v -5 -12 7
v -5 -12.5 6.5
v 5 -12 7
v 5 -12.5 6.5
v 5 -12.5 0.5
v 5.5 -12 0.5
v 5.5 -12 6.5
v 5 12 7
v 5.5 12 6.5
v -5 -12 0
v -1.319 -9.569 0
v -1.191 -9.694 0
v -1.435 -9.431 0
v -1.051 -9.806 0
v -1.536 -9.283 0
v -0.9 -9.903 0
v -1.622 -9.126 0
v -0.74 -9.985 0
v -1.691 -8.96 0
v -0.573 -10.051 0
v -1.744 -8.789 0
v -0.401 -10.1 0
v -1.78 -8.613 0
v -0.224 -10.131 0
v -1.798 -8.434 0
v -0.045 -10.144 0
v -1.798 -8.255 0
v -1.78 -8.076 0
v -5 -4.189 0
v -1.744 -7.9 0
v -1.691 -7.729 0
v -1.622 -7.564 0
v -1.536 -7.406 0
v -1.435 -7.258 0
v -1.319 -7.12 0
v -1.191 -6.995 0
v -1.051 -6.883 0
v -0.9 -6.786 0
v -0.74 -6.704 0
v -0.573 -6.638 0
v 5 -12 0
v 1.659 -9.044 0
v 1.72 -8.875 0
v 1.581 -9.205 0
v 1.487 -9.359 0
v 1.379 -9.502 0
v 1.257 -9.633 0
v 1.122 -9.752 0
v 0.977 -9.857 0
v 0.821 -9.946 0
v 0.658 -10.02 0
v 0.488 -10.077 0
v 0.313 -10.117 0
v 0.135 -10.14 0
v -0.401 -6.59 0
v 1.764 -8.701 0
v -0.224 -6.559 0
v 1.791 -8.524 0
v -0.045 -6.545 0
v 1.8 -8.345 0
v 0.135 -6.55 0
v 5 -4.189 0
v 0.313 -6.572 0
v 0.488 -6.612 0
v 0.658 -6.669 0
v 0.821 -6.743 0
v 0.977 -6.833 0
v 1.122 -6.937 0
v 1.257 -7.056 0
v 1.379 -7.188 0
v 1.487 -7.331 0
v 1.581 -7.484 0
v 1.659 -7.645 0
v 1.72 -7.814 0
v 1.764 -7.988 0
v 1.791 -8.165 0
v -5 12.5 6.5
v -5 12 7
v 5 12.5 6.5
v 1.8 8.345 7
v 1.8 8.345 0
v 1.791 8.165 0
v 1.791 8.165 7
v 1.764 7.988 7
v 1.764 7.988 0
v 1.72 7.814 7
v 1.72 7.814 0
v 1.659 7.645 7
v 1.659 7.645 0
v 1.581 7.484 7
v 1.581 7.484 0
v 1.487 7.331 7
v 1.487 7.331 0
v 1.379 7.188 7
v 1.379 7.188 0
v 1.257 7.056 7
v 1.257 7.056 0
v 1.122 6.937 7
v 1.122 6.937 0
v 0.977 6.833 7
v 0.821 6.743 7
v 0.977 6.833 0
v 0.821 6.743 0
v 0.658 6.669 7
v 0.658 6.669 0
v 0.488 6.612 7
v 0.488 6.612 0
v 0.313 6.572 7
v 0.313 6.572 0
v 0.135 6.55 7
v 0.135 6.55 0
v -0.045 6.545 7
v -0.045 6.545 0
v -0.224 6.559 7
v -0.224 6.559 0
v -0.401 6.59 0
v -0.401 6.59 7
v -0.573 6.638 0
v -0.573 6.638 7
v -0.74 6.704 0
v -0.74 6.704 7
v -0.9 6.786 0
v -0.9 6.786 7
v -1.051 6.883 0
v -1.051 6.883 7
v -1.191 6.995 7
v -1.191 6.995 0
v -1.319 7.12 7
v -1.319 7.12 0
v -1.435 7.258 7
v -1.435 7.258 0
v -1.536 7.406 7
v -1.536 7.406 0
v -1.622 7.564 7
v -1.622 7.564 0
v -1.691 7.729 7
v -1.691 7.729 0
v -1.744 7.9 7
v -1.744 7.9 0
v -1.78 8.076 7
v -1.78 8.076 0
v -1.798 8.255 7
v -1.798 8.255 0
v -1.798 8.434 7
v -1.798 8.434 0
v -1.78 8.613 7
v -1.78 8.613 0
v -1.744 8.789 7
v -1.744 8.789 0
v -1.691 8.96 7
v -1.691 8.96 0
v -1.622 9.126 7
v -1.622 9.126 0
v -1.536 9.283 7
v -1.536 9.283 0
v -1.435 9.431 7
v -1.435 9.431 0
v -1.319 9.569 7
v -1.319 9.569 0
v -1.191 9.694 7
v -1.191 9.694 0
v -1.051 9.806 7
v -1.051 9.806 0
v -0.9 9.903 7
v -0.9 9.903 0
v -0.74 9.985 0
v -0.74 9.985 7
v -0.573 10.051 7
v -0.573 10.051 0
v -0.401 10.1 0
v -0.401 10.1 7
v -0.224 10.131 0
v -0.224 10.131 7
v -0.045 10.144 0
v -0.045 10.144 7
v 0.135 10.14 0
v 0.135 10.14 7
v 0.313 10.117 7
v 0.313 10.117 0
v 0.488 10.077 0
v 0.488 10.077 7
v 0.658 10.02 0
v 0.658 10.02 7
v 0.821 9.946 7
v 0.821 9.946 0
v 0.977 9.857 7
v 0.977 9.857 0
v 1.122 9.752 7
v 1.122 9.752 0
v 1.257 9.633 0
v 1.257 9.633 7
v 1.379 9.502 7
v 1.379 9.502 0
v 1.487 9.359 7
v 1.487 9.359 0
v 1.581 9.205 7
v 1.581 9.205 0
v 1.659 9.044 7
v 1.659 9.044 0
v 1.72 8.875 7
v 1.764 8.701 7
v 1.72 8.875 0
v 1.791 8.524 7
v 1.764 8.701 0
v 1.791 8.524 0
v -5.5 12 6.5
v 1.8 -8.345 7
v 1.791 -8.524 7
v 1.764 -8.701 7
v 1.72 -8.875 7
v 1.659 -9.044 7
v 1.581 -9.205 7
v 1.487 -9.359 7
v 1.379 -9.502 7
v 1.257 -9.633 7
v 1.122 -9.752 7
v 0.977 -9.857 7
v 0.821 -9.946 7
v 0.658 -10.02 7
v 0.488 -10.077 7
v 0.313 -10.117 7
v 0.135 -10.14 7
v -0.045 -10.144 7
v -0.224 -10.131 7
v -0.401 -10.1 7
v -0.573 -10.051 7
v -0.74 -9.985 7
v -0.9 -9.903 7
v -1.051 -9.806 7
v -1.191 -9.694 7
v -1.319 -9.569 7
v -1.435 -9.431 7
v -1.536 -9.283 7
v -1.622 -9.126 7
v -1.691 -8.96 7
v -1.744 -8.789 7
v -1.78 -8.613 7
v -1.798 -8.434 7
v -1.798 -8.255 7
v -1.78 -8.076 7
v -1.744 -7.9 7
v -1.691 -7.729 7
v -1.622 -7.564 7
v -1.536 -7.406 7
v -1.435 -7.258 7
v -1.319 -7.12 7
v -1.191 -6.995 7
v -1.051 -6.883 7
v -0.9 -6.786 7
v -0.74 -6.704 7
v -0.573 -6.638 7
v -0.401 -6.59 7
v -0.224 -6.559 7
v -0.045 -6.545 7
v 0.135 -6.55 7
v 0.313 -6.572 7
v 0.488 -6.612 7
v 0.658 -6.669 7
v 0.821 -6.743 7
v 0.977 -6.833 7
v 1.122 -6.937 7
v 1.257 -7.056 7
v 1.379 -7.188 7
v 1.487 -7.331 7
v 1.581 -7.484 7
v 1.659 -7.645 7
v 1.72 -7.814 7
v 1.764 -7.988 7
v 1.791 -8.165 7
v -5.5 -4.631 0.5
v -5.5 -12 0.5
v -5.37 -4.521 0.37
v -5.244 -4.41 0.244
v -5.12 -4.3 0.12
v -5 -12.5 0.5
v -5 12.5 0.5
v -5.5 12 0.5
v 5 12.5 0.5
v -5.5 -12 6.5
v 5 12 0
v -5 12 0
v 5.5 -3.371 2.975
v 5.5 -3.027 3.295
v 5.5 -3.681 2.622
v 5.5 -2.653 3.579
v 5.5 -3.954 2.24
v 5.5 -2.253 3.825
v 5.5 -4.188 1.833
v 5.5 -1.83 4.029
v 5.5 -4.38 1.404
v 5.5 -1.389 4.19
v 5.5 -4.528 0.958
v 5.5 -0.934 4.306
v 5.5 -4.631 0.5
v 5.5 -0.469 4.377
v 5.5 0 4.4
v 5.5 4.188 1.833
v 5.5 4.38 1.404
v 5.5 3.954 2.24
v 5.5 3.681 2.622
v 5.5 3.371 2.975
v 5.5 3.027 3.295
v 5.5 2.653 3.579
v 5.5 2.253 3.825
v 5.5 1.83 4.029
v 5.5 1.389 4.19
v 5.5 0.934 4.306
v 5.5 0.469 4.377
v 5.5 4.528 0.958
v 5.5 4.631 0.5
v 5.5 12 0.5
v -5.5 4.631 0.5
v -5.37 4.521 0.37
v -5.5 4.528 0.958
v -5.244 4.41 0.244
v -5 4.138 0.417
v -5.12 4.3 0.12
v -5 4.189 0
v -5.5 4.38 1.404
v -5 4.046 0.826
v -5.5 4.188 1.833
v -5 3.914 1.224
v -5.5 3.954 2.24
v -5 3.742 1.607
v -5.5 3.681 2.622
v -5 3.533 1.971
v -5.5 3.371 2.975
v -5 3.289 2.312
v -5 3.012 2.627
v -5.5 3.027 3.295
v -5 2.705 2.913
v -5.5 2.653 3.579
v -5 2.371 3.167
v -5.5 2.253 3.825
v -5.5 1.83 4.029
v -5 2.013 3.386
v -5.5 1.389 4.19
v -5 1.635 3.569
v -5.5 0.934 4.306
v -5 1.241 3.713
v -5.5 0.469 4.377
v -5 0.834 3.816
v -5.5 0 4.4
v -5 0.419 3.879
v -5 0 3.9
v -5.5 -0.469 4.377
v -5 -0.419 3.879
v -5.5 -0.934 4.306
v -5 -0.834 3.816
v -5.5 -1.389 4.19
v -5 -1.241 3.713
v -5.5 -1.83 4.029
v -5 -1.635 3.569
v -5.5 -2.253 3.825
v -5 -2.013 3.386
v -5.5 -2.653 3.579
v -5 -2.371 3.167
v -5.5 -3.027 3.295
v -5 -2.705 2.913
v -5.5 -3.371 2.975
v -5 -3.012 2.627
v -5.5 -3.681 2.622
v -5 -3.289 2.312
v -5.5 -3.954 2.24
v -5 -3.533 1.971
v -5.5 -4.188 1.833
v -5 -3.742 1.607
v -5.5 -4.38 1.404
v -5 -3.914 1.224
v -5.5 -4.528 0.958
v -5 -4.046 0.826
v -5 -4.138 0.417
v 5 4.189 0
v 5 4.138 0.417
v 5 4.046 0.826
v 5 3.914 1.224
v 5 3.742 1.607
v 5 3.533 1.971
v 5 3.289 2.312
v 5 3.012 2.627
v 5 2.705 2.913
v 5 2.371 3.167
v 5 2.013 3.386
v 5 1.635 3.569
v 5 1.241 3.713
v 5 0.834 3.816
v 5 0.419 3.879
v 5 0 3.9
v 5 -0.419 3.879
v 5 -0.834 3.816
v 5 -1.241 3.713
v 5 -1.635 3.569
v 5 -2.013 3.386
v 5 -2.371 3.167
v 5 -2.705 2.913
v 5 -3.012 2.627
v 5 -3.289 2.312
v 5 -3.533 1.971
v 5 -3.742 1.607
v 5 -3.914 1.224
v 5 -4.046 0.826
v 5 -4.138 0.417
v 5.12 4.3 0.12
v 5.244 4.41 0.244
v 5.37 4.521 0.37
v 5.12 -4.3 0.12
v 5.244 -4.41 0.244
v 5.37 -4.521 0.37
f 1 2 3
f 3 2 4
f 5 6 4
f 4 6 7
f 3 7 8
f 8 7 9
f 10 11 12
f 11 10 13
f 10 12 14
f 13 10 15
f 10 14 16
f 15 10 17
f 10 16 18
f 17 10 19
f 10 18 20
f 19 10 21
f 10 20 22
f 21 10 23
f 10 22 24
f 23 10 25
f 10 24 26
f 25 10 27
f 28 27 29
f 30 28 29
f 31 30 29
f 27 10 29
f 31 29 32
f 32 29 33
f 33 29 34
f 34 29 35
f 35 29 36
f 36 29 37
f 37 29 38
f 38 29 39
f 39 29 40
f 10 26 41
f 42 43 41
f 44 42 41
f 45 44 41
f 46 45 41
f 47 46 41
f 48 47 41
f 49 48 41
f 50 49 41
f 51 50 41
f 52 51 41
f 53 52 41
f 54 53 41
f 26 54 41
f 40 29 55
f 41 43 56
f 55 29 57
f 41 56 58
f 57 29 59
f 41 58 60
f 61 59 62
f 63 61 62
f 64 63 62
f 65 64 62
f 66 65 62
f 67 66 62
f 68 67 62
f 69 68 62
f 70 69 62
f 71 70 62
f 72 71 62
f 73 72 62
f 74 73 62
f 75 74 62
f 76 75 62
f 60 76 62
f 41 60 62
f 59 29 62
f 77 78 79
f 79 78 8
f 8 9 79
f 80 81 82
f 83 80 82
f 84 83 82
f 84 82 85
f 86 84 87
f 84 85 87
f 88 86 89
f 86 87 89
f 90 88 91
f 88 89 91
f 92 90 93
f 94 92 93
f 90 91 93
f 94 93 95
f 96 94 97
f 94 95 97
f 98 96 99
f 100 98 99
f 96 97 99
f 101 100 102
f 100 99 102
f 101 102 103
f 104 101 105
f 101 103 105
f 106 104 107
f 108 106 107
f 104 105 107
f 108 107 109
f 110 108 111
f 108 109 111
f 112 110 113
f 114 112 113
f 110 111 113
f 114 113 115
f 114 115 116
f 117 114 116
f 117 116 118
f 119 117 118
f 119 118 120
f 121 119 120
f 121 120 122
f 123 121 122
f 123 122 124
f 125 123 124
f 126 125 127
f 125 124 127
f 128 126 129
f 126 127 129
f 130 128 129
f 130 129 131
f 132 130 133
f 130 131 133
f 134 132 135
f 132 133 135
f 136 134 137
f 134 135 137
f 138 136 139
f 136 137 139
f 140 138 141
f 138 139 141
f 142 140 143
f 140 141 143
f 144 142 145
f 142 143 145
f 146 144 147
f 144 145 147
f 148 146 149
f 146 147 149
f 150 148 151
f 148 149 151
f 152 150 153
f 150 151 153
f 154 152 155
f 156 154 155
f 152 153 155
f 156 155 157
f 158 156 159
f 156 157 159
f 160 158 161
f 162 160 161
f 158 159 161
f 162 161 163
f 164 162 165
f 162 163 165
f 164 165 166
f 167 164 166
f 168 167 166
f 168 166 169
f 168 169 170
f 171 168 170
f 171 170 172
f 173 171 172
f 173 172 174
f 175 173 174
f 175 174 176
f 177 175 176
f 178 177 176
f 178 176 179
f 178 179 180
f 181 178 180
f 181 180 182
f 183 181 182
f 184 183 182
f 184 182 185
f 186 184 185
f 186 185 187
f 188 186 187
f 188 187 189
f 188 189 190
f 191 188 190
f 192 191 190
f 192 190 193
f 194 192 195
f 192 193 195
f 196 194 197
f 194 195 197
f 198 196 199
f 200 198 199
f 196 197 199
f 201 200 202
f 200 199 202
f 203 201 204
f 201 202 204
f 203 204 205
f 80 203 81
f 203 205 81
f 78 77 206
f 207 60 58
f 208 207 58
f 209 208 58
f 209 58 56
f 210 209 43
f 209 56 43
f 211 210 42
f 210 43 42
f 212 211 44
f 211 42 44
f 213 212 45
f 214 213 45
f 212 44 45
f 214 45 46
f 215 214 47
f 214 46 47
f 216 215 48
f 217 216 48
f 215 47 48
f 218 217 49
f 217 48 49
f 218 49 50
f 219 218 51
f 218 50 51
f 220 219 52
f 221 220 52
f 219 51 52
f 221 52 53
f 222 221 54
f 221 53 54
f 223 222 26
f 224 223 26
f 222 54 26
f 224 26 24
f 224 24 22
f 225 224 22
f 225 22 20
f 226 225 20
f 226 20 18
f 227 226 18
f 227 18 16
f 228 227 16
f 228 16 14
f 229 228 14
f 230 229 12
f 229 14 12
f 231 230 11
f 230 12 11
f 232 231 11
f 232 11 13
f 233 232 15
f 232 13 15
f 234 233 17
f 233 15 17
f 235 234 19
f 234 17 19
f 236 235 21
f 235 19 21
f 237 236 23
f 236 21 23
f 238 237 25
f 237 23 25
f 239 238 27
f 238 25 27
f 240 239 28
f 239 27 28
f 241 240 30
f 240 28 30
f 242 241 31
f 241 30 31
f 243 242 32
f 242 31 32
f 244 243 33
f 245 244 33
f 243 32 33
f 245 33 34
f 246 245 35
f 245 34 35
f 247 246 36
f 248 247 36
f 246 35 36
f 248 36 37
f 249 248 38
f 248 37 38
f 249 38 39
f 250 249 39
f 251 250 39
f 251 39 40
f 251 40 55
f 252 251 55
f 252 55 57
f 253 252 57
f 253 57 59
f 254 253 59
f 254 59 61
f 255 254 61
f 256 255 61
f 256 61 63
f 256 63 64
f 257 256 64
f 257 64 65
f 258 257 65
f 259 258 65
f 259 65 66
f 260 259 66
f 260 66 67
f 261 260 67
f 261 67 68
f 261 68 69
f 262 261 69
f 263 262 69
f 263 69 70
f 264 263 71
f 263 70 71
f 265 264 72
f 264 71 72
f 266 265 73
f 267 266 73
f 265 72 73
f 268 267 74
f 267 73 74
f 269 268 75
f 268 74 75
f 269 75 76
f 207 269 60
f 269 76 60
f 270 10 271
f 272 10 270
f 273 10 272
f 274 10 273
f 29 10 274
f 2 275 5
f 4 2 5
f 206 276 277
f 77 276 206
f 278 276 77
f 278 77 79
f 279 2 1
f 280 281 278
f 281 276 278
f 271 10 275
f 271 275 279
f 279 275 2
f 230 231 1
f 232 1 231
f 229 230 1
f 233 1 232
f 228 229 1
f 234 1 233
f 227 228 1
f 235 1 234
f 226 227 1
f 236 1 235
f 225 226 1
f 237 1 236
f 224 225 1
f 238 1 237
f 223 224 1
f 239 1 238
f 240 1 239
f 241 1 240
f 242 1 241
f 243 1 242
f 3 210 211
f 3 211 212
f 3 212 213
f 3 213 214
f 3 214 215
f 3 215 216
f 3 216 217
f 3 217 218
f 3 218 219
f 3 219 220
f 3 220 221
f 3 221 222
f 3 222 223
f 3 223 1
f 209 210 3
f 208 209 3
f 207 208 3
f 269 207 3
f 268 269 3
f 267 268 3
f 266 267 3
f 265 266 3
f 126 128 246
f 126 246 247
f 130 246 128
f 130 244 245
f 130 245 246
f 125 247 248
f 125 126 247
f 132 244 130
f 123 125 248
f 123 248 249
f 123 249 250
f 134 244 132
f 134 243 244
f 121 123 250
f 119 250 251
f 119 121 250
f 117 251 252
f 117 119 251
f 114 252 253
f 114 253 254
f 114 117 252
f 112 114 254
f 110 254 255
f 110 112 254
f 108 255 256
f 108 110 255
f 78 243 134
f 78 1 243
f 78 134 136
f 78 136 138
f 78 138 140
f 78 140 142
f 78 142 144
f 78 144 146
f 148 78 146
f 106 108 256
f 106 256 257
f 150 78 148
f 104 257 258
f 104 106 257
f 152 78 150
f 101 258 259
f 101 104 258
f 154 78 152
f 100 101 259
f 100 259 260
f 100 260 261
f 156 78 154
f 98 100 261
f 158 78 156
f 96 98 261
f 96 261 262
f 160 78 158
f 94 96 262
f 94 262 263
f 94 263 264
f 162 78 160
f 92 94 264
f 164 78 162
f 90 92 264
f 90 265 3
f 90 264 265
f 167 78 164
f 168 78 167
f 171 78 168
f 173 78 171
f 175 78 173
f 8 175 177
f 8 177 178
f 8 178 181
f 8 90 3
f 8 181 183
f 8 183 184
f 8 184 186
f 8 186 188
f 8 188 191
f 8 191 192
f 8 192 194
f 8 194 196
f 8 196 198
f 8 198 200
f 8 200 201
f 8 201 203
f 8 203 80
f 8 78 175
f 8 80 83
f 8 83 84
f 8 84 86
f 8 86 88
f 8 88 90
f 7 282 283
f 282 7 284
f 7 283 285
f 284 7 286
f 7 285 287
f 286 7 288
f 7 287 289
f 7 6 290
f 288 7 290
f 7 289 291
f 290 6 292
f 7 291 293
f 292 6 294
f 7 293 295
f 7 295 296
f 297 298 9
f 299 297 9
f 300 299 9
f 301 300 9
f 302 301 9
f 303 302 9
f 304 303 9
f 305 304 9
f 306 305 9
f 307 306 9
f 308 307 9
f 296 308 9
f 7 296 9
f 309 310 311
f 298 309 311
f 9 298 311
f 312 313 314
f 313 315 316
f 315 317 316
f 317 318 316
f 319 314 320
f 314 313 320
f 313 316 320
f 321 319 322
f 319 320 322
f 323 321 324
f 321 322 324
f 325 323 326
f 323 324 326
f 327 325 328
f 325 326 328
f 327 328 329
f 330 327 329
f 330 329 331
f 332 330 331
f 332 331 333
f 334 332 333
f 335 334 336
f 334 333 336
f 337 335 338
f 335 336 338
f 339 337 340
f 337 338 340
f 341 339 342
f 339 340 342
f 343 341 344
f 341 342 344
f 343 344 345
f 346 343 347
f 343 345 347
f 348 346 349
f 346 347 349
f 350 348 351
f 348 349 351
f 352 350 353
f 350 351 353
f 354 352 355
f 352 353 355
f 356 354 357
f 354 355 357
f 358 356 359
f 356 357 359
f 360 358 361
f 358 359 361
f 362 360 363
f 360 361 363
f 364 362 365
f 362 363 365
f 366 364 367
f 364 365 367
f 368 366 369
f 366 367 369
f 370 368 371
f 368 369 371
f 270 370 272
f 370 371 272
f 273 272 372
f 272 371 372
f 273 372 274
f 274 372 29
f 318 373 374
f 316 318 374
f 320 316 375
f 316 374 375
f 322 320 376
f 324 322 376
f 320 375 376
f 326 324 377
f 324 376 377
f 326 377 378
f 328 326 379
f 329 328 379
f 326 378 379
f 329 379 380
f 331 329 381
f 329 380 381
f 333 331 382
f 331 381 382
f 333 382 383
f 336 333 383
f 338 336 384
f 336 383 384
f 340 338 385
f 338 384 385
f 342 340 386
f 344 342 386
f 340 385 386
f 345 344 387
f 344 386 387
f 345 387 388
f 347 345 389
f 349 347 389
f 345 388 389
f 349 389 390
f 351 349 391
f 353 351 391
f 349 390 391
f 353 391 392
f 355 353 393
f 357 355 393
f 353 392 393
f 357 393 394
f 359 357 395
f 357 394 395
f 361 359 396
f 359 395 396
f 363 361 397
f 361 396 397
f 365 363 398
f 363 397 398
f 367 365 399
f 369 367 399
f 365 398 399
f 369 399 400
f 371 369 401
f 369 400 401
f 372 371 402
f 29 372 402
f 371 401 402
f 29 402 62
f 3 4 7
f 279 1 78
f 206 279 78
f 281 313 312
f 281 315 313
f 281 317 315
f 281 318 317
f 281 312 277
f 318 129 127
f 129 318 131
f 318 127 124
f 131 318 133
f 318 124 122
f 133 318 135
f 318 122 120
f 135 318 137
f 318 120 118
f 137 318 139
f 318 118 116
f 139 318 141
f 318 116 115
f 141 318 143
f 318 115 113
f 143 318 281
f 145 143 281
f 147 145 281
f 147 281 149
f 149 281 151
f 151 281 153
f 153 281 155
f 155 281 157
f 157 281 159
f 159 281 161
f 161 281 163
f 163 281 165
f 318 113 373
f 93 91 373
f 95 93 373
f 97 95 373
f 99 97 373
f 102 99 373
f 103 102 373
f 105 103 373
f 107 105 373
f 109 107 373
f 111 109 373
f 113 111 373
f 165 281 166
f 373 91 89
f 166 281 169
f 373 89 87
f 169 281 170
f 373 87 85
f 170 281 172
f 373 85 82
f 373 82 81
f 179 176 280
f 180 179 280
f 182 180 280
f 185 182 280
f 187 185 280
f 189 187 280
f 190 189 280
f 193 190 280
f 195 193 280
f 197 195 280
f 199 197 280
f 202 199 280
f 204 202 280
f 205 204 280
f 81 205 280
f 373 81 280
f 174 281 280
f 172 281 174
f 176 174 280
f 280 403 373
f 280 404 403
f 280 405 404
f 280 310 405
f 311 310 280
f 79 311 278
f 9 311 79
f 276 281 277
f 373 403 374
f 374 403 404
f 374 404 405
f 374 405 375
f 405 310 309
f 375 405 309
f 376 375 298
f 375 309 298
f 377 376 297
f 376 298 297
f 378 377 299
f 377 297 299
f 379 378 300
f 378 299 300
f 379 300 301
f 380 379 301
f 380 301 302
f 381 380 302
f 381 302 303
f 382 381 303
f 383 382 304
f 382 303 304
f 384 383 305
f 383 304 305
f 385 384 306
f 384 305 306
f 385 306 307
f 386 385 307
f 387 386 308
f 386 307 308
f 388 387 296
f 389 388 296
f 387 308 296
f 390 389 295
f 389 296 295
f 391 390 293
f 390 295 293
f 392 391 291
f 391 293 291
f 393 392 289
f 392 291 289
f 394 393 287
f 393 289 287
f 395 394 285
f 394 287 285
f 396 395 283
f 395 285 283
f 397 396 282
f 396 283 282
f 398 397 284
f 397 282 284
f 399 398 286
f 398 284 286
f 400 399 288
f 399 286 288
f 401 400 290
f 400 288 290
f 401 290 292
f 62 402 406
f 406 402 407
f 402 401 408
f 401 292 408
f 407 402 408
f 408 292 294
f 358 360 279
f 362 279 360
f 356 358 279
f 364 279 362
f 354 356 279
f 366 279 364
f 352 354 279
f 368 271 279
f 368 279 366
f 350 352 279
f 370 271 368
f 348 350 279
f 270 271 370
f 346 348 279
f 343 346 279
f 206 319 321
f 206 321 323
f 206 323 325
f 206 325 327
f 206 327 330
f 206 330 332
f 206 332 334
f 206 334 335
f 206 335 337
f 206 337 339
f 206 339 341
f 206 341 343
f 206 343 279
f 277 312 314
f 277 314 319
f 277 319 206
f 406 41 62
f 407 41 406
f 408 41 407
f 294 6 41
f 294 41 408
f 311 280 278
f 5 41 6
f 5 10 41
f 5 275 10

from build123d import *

# Parameters (mm, degrees)
F0_W     = 11
F0_H     = 25
F1_DEPTH = 7
F3_DEPTH = 11
F4_R     = 1.8
F5_DEPTH = 7
F6_SIZE  = 0.5


with BuildPart() as f1:
    # F0 (on Top) → F1 (new body)
    with BuildSketch(Plane.XY):
        Rectangle(F0_W, F0_H)
    extrude(amount=F1_DEPTH)

    # F2 (on face) → F3 (cut, through all)
    with BuildSketch(Plane.YZ.offset(5.5)):
        with BuildLine():
            Line((-4.1892720131, 0), (4.1892720131, 0))
            ThreePointArc((4.1892720131, 0), (0, 3.9), (-4.1892720131, 0))
        make_face()
    extrude(amount=-F3_DEPTH, mode=Mode.SUBTRACT)

    # F4 (on face) → F5 (cut, through all)
    with BuildSketch(Plane(origin=(0, 0, 0), x_dir=(1, 0, 0), z_dir=(0, 0, -1))):
        with Locations((0, 8.3446360066)):
            Circle(F4_R)
        with Locations((0, -8.3446360066)):
            Circle(F4_R)
    extrude(amount=-F5_DEPTH, mode=Mode.SUBTRACT)

    # F6
    f6_edges = [f1.edges().sort_by_distance(p)[0] for p in [
        (5.5, 0, 3.9),
        (5.5, 8.344636, 0),
        (0, 12.5, 0),
        (-5.5, 8.344636, 0),
        (5.5, -8.344636, 0),
        (0, -12.5, 0),
        (-5.5, -8.344636, 0),
        (5.5, -12.5, 3.5),
        (0, -12.5, 7),
        (-5.5, -12.5, 3.5),
        (5.5, 0, 7),
        (5.5, 12.5, 3.5),
        (0, 12.5, 7),
        (-5.5, 12.5, 3.5),
        (-5.5, 0, 7),
        (-5.5, 0, 3.9),
    ]]
    chamfer(f6_edges, length=F6_SIZE)


solid = f1.part
